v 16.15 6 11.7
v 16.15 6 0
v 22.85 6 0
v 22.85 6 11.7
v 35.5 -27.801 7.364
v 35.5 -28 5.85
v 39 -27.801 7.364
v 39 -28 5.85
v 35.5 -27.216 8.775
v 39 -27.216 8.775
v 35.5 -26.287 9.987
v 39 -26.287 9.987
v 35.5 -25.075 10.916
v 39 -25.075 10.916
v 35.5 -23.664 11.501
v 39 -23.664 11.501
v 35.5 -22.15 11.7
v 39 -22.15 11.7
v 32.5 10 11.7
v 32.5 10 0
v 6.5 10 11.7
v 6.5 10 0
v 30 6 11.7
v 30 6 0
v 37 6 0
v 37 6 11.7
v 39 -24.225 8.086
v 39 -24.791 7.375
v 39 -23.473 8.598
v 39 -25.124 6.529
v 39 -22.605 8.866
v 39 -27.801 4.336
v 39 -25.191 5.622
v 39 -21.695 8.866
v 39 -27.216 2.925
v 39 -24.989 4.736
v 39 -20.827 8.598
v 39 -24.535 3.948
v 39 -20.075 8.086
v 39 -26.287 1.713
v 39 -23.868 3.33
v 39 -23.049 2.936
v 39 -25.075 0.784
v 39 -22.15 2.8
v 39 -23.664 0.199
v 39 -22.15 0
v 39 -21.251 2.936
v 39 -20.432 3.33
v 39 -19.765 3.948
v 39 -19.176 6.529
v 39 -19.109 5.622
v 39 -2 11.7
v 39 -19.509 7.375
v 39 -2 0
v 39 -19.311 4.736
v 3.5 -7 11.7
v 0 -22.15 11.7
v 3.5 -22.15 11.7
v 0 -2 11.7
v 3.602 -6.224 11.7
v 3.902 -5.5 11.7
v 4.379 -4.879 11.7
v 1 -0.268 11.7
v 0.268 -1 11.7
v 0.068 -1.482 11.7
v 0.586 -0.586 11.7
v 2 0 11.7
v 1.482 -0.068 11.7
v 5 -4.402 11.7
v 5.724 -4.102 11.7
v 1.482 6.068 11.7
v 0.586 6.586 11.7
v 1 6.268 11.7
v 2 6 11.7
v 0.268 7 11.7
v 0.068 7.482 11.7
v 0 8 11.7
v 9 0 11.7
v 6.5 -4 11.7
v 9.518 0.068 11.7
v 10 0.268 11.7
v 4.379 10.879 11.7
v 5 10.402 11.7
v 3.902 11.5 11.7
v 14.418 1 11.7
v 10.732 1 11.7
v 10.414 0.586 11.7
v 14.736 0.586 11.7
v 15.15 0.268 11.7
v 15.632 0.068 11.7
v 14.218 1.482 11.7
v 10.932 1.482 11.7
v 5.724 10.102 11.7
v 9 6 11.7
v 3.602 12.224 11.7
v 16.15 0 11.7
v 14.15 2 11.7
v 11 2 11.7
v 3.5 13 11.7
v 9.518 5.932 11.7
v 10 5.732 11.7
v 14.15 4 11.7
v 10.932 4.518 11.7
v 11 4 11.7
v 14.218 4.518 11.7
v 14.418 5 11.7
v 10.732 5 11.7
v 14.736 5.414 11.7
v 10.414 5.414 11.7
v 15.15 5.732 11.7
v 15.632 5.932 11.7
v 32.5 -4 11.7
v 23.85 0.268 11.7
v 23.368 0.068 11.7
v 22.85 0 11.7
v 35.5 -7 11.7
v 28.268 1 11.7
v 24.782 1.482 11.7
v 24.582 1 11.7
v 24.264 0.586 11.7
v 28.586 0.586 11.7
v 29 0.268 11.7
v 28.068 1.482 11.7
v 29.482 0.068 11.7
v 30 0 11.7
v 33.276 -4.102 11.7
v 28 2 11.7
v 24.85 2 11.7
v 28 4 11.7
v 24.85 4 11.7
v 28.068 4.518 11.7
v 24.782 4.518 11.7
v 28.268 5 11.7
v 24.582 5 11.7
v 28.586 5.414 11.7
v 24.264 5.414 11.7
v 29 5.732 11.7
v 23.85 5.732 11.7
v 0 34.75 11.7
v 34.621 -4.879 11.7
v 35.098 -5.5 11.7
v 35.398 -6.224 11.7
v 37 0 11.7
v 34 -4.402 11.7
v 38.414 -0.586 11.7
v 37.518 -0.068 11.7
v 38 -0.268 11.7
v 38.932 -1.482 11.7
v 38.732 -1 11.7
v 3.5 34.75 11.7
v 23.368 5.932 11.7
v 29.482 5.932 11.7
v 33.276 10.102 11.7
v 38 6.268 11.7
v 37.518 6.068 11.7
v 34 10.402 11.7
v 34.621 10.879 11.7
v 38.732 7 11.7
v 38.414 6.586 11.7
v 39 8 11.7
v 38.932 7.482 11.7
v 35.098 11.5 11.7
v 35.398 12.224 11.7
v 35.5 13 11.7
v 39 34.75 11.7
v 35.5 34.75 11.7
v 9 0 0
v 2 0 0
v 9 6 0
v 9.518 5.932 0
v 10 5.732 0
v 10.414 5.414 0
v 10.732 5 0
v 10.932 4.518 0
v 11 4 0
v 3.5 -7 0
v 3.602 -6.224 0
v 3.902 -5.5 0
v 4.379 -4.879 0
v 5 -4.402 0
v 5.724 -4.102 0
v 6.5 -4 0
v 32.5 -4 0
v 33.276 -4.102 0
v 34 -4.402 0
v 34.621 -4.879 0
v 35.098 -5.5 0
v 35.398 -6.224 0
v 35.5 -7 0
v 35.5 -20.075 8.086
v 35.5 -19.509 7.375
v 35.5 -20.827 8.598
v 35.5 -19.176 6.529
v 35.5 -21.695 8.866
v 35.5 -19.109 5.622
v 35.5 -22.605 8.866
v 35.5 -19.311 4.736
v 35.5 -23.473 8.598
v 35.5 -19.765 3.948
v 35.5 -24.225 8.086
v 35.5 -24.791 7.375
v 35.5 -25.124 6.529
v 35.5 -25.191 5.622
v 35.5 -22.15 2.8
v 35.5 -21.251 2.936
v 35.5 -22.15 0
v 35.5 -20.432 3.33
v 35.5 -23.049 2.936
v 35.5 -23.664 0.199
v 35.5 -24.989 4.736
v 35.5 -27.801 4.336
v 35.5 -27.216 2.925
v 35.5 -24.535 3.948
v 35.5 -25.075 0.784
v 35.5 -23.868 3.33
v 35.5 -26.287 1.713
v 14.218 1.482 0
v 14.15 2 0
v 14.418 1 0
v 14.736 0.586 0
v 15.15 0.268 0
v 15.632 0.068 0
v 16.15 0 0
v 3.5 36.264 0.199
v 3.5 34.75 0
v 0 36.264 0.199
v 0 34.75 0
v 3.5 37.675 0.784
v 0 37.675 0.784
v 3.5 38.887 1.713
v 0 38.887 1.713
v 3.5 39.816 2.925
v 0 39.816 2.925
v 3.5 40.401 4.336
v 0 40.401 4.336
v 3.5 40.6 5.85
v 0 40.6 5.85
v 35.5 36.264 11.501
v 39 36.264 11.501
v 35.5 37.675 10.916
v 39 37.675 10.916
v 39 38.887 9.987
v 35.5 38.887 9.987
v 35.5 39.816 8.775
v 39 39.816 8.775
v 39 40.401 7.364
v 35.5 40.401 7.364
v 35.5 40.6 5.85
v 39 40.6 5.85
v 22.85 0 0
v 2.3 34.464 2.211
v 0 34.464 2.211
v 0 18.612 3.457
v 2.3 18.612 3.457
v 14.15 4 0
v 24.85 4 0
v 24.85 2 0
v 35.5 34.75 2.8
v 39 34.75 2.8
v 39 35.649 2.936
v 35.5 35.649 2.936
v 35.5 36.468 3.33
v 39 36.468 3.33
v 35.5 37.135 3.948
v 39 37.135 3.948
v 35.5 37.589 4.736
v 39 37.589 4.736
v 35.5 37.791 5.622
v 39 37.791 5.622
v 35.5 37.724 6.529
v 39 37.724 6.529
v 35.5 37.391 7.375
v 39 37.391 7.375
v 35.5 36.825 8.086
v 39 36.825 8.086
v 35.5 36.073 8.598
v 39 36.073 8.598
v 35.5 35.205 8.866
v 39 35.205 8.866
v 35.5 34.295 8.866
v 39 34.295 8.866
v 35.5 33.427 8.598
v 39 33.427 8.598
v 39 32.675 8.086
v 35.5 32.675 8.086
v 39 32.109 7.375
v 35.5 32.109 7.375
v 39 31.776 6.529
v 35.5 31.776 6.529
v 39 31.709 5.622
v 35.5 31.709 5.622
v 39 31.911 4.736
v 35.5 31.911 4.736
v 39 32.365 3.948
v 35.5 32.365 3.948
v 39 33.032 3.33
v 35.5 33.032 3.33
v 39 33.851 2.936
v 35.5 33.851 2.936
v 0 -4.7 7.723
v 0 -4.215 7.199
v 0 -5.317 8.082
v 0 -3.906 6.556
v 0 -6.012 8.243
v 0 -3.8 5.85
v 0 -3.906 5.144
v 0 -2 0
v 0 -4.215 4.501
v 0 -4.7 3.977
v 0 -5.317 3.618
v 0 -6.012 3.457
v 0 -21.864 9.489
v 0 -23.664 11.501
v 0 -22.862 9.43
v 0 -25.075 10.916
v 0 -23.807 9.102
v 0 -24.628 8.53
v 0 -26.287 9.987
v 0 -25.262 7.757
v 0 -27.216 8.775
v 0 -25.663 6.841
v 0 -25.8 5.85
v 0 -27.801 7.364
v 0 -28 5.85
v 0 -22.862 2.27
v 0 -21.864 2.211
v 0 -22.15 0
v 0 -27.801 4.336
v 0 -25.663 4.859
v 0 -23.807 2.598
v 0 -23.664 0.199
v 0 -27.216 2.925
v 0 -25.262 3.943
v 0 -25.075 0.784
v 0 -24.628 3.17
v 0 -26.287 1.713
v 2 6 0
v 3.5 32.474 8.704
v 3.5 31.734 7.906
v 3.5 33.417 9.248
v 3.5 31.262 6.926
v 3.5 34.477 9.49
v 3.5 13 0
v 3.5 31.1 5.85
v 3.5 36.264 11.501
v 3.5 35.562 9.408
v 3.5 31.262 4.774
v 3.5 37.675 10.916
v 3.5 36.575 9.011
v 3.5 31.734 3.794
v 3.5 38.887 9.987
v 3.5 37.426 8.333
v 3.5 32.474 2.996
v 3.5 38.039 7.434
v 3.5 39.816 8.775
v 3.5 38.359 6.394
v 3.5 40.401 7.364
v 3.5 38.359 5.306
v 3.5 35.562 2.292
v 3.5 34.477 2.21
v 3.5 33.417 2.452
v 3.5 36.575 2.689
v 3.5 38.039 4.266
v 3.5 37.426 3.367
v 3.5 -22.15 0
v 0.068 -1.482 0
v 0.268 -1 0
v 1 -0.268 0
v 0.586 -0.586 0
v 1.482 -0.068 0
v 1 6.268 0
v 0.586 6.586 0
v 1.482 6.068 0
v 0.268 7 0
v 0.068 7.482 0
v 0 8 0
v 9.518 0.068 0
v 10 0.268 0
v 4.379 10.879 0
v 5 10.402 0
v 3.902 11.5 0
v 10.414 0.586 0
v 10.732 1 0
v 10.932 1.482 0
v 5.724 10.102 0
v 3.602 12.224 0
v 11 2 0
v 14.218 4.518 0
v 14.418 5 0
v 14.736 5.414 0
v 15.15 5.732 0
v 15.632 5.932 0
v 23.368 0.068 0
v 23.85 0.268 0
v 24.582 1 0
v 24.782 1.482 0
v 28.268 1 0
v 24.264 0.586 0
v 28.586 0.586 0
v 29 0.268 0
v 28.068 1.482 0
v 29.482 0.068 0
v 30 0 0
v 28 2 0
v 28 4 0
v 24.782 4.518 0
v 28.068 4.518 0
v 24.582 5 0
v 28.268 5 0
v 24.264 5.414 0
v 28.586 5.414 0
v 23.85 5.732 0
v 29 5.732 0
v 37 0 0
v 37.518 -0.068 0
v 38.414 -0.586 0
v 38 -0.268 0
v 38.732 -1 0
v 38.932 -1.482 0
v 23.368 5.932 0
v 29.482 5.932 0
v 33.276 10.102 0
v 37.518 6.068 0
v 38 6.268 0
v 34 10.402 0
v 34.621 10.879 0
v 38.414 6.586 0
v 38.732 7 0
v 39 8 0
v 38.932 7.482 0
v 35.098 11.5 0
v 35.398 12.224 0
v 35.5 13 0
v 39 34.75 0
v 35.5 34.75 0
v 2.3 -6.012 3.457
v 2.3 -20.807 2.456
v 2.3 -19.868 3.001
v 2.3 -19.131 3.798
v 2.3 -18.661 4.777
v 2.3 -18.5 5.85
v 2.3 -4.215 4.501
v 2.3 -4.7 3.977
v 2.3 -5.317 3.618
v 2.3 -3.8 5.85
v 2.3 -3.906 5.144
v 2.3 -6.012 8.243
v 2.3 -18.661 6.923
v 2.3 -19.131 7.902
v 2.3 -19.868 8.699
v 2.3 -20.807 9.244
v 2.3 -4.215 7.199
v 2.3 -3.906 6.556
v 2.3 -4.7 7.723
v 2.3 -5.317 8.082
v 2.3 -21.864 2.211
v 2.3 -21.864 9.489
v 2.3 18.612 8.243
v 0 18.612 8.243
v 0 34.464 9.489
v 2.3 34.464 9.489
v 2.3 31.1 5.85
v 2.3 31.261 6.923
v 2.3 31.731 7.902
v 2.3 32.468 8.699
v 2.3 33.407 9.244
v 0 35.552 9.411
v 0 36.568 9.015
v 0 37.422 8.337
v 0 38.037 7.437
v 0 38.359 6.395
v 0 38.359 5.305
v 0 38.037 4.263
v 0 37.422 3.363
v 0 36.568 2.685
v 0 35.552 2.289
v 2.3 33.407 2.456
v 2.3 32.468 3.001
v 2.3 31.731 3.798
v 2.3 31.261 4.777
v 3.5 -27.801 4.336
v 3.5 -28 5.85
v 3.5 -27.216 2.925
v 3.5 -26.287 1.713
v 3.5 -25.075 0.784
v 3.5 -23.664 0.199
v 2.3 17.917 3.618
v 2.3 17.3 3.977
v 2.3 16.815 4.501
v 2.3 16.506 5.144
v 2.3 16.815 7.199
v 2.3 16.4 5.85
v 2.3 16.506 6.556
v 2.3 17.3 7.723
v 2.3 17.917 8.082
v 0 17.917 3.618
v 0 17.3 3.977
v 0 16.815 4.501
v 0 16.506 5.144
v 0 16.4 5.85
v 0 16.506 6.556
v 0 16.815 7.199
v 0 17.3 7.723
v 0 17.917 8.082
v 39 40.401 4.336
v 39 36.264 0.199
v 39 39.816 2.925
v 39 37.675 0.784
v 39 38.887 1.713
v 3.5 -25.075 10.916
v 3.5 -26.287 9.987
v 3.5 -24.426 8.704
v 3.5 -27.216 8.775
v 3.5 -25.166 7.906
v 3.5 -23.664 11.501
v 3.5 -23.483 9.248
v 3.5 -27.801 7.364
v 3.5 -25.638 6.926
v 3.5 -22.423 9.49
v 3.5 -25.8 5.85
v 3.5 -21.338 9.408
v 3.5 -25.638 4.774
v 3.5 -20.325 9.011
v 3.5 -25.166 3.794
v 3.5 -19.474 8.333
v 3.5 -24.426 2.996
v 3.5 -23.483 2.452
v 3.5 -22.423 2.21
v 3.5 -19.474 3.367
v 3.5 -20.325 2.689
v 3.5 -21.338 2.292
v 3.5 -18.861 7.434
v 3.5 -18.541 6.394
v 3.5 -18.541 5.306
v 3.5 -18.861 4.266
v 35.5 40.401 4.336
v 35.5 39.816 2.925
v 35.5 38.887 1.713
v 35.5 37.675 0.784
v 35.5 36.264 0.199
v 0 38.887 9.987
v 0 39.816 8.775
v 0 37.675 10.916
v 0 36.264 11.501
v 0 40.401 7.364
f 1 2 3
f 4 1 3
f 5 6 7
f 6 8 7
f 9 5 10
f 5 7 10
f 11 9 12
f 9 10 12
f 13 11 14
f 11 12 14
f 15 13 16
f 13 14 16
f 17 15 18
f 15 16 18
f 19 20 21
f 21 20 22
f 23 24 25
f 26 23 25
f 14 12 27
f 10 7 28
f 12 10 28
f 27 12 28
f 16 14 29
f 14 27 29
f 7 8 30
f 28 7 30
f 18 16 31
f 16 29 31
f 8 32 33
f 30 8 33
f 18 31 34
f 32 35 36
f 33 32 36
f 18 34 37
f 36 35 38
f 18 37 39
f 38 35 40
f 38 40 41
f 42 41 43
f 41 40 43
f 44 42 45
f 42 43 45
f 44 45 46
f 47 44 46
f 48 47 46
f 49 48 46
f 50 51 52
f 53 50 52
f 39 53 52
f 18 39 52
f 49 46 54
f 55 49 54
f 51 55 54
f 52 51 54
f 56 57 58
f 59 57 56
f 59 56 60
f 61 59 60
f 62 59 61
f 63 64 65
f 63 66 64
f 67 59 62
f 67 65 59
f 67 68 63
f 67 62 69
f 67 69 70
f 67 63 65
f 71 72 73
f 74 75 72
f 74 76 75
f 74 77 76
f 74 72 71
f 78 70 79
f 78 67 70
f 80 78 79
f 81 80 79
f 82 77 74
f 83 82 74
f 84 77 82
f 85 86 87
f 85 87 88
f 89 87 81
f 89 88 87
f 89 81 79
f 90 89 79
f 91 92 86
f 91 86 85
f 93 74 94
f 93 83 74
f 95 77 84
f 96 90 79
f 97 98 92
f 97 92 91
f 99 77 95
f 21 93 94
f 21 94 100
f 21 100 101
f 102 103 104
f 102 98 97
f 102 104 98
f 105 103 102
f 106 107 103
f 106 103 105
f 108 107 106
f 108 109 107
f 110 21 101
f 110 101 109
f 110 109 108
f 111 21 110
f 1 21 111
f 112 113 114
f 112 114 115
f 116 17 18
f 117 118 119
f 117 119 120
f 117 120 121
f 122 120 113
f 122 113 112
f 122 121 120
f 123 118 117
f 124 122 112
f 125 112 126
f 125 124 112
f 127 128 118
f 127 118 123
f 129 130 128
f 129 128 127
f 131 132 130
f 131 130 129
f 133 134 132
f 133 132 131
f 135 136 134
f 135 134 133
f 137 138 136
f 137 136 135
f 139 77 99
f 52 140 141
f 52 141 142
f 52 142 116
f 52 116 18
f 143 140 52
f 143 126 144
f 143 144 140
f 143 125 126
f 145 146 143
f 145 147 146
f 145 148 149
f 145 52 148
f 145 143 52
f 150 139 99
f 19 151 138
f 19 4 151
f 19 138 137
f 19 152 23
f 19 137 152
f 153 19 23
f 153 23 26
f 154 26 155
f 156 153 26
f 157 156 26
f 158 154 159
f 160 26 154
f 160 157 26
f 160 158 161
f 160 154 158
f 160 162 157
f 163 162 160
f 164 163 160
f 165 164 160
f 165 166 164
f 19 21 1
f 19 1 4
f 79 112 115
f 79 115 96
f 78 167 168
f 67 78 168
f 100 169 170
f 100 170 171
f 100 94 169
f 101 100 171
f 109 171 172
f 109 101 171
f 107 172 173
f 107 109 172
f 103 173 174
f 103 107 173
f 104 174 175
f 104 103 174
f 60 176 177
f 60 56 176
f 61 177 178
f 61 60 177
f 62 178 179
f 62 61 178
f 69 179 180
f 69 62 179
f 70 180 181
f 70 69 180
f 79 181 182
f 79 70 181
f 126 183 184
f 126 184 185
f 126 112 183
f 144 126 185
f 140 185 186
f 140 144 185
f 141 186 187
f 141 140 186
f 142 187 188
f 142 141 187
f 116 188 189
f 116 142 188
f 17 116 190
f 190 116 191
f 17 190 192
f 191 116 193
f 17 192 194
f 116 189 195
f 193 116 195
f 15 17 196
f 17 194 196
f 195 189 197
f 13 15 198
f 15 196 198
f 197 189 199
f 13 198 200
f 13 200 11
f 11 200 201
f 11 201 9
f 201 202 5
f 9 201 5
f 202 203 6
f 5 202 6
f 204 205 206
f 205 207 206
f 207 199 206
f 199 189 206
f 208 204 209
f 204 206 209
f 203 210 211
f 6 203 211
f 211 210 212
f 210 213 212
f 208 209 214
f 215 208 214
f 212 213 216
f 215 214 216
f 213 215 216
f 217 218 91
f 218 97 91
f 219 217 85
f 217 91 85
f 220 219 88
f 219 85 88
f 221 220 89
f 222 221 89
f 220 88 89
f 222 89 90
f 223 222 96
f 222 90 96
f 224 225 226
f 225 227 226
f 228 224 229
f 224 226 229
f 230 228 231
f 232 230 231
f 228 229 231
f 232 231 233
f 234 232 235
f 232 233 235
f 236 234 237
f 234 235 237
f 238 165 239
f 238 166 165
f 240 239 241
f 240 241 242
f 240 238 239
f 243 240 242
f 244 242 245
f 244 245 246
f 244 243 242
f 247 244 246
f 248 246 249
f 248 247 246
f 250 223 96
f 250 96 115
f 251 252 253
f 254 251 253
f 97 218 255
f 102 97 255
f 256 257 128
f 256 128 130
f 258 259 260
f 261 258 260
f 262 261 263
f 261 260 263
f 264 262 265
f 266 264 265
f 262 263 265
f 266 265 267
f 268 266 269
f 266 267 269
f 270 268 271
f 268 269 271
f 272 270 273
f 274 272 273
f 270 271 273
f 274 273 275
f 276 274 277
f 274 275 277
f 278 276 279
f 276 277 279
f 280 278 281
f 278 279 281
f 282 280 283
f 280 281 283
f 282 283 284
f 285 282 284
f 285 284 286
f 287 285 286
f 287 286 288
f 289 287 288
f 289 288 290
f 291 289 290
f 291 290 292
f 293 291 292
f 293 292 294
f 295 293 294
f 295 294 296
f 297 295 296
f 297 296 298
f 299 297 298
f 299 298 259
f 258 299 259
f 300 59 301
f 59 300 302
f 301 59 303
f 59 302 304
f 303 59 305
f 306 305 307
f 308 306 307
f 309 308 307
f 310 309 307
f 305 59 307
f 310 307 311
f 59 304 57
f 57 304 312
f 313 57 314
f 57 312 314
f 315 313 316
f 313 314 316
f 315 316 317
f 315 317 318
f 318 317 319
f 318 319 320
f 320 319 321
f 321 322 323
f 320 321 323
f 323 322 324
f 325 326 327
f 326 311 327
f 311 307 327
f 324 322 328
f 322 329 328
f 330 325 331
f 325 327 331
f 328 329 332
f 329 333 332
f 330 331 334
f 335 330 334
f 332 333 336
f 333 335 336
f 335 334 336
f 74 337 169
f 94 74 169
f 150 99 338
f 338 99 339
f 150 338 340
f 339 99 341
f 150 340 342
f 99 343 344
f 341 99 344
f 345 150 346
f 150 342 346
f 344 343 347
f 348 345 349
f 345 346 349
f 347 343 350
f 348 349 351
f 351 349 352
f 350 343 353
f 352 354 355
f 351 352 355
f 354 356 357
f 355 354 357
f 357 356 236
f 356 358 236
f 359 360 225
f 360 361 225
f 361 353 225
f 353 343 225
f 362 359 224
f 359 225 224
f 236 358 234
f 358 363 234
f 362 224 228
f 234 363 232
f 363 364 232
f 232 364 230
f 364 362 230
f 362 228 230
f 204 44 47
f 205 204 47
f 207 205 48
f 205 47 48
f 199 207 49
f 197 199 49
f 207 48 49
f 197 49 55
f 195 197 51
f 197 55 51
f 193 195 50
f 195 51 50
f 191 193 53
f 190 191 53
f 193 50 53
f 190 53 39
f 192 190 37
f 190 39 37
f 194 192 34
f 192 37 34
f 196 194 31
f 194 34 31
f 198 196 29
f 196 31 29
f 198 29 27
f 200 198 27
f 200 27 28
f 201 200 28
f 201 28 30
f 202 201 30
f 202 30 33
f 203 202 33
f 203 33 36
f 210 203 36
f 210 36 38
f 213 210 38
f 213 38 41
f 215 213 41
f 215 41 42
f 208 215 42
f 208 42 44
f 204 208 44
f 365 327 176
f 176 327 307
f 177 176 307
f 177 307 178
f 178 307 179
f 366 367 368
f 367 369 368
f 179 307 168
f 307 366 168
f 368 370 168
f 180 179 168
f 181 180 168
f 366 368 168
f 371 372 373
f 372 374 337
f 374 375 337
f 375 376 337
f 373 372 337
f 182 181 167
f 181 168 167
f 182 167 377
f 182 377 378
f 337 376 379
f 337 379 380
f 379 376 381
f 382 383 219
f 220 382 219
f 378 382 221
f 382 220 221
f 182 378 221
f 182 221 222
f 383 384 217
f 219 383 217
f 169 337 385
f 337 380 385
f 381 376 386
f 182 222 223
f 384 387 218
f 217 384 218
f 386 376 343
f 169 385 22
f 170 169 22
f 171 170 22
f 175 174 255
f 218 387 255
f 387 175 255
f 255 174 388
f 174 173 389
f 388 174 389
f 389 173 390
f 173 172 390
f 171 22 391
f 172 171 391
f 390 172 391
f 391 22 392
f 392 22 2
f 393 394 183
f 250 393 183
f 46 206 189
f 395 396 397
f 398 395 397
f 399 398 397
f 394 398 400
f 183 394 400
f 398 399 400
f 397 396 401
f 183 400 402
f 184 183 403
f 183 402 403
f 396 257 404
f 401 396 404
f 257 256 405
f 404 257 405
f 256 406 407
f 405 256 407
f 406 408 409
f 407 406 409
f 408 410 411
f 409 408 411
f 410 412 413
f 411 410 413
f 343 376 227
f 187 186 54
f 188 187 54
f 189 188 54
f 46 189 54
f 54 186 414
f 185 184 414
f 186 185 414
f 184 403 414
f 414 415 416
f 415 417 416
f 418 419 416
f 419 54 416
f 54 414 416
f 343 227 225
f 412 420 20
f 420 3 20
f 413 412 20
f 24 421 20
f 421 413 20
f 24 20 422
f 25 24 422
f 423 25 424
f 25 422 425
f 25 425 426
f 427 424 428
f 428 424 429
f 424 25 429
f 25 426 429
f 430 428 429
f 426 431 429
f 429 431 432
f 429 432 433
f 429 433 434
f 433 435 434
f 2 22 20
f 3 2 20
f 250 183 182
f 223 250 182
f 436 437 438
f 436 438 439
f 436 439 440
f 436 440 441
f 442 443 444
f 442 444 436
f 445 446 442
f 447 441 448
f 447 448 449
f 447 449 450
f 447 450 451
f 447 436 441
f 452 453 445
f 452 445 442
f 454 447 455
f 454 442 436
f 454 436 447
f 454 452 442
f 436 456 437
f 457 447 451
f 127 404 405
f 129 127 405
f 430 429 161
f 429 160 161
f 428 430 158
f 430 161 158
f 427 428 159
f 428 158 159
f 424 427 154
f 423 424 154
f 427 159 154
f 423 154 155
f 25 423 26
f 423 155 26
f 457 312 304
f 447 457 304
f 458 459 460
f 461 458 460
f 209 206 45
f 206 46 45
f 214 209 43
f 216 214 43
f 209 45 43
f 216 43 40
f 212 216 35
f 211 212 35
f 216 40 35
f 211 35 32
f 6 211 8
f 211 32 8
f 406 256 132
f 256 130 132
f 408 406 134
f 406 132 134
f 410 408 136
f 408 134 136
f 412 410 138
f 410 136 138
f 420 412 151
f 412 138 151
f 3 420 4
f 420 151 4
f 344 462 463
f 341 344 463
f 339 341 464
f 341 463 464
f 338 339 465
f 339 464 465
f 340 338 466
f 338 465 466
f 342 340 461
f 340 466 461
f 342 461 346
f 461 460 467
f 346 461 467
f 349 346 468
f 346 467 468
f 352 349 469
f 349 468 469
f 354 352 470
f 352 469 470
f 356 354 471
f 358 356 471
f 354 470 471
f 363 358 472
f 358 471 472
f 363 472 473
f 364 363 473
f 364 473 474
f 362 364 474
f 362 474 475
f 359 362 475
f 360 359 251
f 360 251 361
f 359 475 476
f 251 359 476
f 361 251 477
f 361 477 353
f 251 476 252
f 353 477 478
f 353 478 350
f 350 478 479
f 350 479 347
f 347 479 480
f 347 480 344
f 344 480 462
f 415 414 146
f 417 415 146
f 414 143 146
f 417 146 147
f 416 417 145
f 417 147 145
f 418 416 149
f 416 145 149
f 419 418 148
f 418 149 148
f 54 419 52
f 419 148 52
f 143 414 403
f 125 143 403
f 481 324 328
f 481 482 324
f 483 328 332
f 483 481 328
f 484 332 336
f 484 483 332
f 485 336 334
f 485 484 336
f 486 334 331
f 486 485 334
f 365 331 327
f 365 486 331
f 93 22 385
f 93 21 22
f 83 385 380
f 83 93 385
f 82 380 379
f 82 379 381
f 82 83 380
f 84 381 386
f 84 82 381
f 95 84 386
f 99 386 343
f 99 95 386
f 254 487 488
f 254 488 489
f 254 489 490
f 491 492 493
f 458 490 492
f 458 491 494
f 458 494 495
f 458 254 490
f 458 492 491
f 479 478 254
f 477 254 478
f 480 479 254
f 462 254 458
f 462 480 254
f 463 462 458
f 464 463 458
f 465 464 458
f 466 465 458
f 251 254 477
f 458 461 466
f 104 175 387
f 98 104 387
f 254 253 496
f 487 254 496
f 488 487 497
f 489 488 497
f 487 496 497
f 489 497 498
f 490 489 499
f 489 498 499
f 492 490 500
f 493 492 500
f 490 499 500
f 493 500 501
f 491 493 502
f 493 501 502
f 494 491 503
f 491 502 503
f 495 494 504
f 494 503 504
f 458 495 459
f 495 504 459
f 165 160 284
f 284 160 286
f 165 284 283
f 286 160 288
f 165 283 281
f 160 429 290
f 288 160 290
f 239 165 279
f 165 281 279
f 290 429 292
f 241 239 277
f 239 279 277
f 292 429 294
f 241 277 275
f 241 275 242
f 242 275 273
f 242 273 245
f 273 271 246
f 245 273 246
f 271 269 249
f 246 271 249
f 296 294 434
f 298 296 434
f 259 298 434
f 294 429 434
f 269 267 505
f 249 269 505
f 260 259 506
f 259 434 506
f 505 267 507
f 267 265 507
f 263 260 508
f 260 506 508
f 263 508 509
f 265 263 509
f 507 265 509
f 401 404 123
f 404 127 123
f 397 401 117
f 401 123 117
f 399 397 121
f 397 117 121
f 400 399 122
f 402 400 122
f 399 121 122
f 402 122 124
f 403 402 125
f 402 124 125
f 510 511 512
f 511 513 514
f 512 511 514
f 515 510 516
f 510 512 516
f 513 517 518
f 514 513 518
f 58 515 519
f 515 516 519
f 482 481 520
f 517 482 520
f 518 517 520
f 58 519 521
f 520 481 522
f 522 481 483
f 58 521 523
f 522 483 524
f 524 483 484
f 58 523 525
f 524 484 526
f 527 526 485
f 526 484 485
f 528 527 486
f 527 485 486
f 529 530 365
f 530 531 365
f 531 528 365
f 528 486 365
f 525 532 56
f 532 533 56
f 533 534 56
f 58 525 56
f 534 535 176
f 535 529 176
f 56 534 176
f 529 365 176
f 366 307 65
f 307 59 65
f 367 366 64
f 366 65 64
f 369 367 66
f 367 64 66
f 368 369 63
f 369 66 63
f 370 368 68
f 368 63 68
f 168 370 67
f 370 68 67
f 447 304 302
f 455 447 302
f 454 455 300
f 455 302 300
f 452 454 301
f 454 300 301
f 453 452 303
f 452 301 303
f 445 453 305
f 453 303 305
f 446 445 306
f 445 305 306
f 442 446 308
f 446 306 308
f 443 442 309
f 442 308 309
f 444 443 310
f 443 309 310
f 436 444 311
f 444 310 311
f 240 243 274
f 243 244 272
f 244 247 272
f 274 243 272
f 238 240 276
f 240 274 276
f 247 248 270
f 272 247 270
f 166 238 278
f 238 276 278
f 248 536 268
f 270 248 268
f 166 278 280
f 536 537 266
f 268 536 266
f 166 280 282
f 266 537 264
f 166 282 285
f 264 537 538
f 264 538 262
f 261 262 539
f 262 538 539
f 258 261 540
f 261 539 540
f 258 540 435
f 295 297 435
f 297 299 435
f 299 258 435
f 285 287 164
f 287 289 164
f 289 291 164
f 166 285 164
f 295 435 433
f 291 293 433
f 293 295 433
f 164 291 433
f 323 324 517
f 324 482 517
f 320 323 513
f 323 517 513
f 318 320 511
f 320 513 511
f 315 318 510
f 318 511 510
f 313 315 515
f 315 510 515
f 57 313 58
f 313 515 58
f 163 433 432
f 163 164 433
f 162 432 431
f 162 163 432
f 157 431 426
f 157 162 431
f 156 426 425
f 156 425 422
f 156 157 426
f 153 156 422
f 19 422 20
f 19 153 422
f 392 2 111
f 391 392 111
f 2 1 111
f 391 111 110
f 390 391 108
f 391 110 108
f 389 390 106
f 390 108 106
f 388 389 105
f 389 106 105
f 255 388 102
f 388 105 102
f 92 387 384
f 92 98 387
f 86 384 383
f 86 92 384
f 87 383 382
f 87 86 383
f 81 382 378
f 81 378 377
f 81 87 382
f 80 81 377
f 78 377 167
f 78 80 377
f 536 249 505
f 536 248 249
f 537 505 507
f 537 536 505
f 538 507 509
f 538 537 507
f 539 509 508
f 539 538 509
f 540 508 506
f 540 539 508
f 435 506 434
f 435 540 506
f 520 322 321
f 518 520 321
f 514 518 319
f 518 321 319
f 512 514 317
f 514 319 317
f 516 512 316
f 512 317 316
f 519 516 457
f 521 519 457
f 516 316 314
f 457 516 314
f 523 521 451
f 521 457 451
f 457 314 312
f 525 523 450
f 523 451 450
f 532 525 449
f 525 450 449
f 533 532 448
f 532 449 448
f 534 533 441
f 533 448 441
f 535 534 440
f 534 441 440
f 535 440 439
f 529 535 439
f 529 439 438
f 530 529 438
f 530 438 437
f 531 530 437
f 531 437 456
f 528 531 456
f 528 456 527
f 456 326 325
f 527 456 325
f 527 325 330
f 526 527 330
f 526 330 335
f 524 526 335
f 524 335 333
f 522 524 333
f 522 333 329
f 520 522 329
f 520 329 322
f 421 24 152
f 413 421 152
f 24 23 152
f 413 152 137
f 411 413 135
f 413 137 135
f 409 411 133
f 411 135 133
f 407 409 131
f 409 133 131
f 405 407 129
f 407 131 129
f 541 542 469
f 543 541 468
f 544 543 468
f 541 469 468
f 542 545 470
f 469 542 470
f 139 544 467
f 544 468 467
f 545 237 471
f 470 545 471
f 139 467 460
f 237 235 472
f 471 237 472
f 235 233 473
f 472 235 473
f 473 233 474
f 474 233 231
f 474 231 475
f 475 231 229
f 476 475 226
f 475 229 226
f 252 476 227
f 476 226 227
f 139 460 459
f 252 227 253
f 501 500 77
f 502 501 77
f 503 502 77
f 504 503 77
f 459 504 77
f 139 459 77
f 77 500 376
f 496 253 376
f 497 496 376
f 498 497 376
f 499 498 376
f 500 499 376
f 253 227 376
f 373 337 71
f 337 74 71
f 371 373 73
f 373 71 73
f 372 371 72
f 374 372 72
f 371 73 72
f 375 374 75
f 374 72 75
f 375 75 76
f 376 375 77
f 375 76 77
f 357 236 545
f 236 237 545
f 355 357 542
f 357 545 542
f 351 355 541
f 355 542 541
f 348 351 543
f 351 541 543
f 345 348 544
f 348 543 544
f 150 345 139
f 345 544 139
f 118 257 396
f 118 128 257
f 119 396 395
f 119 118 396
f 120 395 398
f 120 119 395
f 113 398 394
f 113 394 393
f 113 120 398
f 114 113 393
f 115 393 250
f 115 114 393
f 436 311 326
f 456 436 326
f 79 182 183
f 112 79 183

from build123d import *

# Parameters (mm, degrees)
SKETCH_1_W          = 10.7
SKETCH_1_H          = 6
EXTRUDE_1_DEPTH     = 11.7
SKETCH_2_R          = 3.65
CUT_EXTRUDE_1_DEPTH = 18.7
CUT_EXTRUDE_2_DEPTH = 2.3
SKETCH_2_4_R        = 3.65
CUT_EXTRUDE_3_DEPTH = 15.3
CUT_EXTRUDE_4_DEPTH = 2.3
FILLET_1_R          = 2
FILLET_2_R          = 2
FILLET_3_R          = 2
FILLET_4_R          = 2
FILLET_5_R          = 5.85
FILLET_6_R          = 5.85
FILLET_7_R          = 5.85
FILLET_8_R          = 5.85
FILLET_9_R          = 5.85
FILLET_10_R         = 5.85
FILLET_11_R         = 5.85
FILLET_12_R         = 5.85
FILLET_13_R         = 2
FILLET_14_R         = 2
FILLET_15_R         = 2
FILLET_16_R         = 2
FILLET_17_R         = 2
FILLET_18_R         = 2
FILLET_19_R         = 2
FILLET_20_R         = 2
SKETCH_3_R          = 3.05
CUT_EXTRUDE_5_DEPTH = 10
FILLET_21_R         = 3
FILLET_22_R         = 3
FILLET_23_R         = 3
FILLET_24_R         = 3


with BuildPart() as part:
    # 草图1 → 凸台-拉伸1 (new body)
    with BuildSketch(Plane.XY):
        Polygon((0, 0), (0, -28), (3.5, -28), (3.5, -4), (35.5, -4), (35.5, -28), (39, -28), (39, 0), (28, 0), (28, 6), (39, 6), (39, 40.6), (35.5, 40.6), (35.5, 10), (3.5, 10), (3.5, 40.6), (0, 40.6), (0, 6), (11, 6), (11, 0), align=None)
        with Locations((19.5, 3)):
            Rectangle(SKETCH_1_W, SKETCH_1_H, mode=Mode.SUBTRACT)
    extrude(amount=EXTRUDE_1_DEPTH)

    # 草图2 → 切除-拉伸1 (cut)
    with BuildSketch(Plane.ZY):
        with Locations(Location((5.85, -22.15, 0), (0, 0, 270))):
            Circle(SKETCH_2_R)
    extrude(amount=-CUT_EXTRUDE_1_DEPTH, mode=Mode.SUBTRACT)

    # 草图2<3> → 切除-拉伸2 (cut)
    with BuildSketch(Plane.ZY):
        with BuildLine():
            ThreePointArc((8.242618438, -6.011912226), (5.85, -3.8), (3.457381562, -6.011912226))
            Line((3.457381562, -6.011912226), (2.211226126, -21.863949843))
            ThreePointArc((2.211226126, -21.863949843), (5.85, -18.5), (9.488773874, -21.863949843))
            Line((9.488773874, -21.863949843), (8.242618438, -6.011912226))
        make_face()
    extrude(amount=-CUT_EXTRUDE_2_DEPTH, mode=Mode.SUBTRACT)

    # 草图2<4> → 切除-拉伸3 (cut)
    with BuildSketch(Plane.ZY):
        with Locations(Location((5.85, 34.75, 0), (0, 0, 270))):
            Circle(SKETCH_2_4_R)
    extrude(amount=-CUT_EXTRUDE_3_DEPTH, mode=Mode.SUBTRACT)

    # 草图2<5> → 切除-拉伸4 (cut)
    with BuildSketch(Plane.ZY):
        with BuildLine():
            Line((2.211226126, 34.463949843), (3.457381562, 18.611912226))
            ThreePointArc((3.457381562, 18.611912226), (5.85, 16.4), (8.242618438, 18.611912226))
            Line((8.242618438, 18.611912226), (9.488773874, 34.463949843))
            ThreePointArc((9.488773874, 34.463949843), (5.85, 31.1), (2.211226126, 34.463949843))
        make_face()
    extrude(amount=-CUT_EXTRUDE_4_DEPTH, mode=Mode.SUBTRACT)

    # 圆角1
    fillet_1_edges = [part.edges().sort_by_distance(p)[0] for p in [
        (0, 6, 5.85),
    ]]
    fillet(fillet_1_edges, radius=FILLET_1_R)

    # 圆角2
    fillet_2_edges = [part.edges().sort_by_distance(p)[0] for p in [
        (39, 6, 5.85),
    ]]
    fillet(fillet_2_edges, radius=FILLET_2_R)

    # 圆角3
    fillet_3_edges = [part.edges().sort_by_distance(p)[0] for p in [
        (39, 0, 5.85),
    ]]
    fillet(fillet_3_edges, radius=FILLET_3_R)

    # 圆角4
    fillet_4_edges = [part.edges().sort_by_distance(p)[0] for p in [
        (0, 0, 5.85),
    ]]
    fillet(fillet_4_edges, radius=FILLET_4_R)

    # 圆角5
    fillet_5_edges = [part.edges().sort_by_distance(p)[0] for p in [
        (1.75, -28, 11.7),
    ]]
    fillet(fillet_5_edges, radius=FILLET_5_R)

    # 圆角6
    fillet_6_edges = [part.edges().sort_by_distance(p)[0] for p in [
        (1.75, -28, 0),
    ]]
    fillet(fillet_6_edges, radius=FILLET_6_R - 0.0001)  # a hair under: the kernel refuses the full size

    # 圆角7
    fillet_7_edges = [part.edges().sort_by_distance(p)[0] for p in [
        (37.25, -28, 0),
    ]]
    fillet(fillet_7_edges, radius=FILLET_7_R)

    # 圆角8
    fillet_8_edges = [part.edges().sort_by_distance(p)[0] for p in [
        (37.25, -28, 11.7),
    ]]
    fillet(fillet_8_edges, radius=FILLET_8_R - 0.0001)  # a hair under: the kernel refuses the full size

    # 圆角9
    fillet_9_edges = [part.edges().sort_by_distance(p)[0] for p in [
        (37.25, 40.6, 11.7),
    ]]
    fillet(fillet_9_edges, radius=FILLET_9_R)

    # 圆角10
    fillet_10_edges = [part.edges().sort_by_distance(p)[0] for p in [
        (37.25, 40.6, 0),
    ]]
    fillet(fillet_10_edges, radius=FILLET_10_R - 0.0001)  # a hair under: the kernel refuses the full size

    # 圆角11
    fillet_11_edges = [part.edges().sort_by_distance(p)[0] for p in [
        (1.75, 40.6, 0),
    ]]
    fillet(fillet_11_edges, radius=FILLET_11_R)

    # 圆角12
    fillet_12_edges = [part.edges().sort_by_distance(p)[0] for p in [
        (1.75, 40.6, 11.7),
    ]]
    fillet(fillet_12_edges, radius=FILLET_12_R - 0.0001)  # a hair under: the kernel refuses the full size

    # 圆角13
    fillet_13_edges = [part.edges().sort_by_distance(p)[0] for p in [
        (28, 6, 5.85),
    ]]
    fillet(fillet_13_edges, radius=FILLET_13_R)

    # 圆角14
    fillet_14_edges = [part.edges().sort_by_distance(p)[0] for p in [
        (28, 0, 5.85),
    ]]
    fillet(fillet_14_edges, radius=FILLET_14_R)

    # 圆角15
    fillet_15_edges = [part.edges().sort_by_distance(p)[0] for p in [
        (11, 6, 5.85),
    ]]
    fillet(fillet_15_edges, radius=FILLET_15_R)

    # 圆角16
    fillet_16_edges = [part.edges().sort_by_distance(p)[0] for p in [
        (11, 0, 5.85),
    ]]
    fillet(fillet_16_edges, radius=FILLET_16_R)

    # 圆角17
    fillet_17_edges = [part.edges().sort_by_distance(p)[0] for p in [
        (24.85, 6, 5.85),
    ]]
    fillet(fillet_17_edges, radius=FILLET_17_R)

    # 圆角18
    fillet_18_edges = [part.edges().sort_by_distance(p)[0] for p in [
        (24.85, 0, 5.85),
    ]]
    fillet(fillet_18_edges, radius=FILLET_18_R)

    # 圆角19
    fillet_19_edges = [part.edges().sort_by_distance(p)[0] for p in [
        (14.15, 6, 5.85),
    ]]
    fillet(fillet_19_edges, radius=FILLET_19_R)

    # 圆角20
    fillet_20_edges = [part.edges().sort_by_distance(p)[0] for p in [
        (14.15, 0, 5.85),
    ]]
    fillet(fillet_20_edges, radius=FILLET_20_R)

    # 草图3 → 切除-拉伸5 (cut)
    with BuildSketch(Plane(origin=(39, 0, 0), x_dir=(0, 0, -1), z_dir=(1, 0, 0))):
        with Locations((-5.85, 34.75)):
            Circle(SKETCH_3_R)
        with Locations((-5.85, -22.15)):
            Circle(SKETCH_3_R)
    extrude(amount=-CUT_EXTRUDE_5_DEPTH, mode=Mode.SUBTRACT)

    # 圆角21
    fillet_21_edges = [part.edges().sort_by_distance(p)[0] for p in [
        (3.5, -4, 5.85),
    ]]
    fillet(fillet_21_edges, radius=FILLET_21_R)

    # 圆角22
    fillet_22_edges = [part.edges().sort_by_distance(p)[0] for p in [
        (35.5, -4, 5.85),
    ]]
    fillet(fillet_22_edges, radius=FILLET_22_R)

    # 圆角23
    fillet_23_edges = [part.edges().sort_by_distance(p)[0] for p in [
        (35.5, 10, 5.85),
    ]]
    fillet(fillet_23_edges, radius=FILLET_23_R)

    # 圆角24
    fillet_24_edges = [part.edges().sort_by_distance(p)[0] for p in [
        (3.5, 10, 5.85),
    ]]
    fillet(fillet_24_edges, radius=FILLET_24_R)


solid = part.part
